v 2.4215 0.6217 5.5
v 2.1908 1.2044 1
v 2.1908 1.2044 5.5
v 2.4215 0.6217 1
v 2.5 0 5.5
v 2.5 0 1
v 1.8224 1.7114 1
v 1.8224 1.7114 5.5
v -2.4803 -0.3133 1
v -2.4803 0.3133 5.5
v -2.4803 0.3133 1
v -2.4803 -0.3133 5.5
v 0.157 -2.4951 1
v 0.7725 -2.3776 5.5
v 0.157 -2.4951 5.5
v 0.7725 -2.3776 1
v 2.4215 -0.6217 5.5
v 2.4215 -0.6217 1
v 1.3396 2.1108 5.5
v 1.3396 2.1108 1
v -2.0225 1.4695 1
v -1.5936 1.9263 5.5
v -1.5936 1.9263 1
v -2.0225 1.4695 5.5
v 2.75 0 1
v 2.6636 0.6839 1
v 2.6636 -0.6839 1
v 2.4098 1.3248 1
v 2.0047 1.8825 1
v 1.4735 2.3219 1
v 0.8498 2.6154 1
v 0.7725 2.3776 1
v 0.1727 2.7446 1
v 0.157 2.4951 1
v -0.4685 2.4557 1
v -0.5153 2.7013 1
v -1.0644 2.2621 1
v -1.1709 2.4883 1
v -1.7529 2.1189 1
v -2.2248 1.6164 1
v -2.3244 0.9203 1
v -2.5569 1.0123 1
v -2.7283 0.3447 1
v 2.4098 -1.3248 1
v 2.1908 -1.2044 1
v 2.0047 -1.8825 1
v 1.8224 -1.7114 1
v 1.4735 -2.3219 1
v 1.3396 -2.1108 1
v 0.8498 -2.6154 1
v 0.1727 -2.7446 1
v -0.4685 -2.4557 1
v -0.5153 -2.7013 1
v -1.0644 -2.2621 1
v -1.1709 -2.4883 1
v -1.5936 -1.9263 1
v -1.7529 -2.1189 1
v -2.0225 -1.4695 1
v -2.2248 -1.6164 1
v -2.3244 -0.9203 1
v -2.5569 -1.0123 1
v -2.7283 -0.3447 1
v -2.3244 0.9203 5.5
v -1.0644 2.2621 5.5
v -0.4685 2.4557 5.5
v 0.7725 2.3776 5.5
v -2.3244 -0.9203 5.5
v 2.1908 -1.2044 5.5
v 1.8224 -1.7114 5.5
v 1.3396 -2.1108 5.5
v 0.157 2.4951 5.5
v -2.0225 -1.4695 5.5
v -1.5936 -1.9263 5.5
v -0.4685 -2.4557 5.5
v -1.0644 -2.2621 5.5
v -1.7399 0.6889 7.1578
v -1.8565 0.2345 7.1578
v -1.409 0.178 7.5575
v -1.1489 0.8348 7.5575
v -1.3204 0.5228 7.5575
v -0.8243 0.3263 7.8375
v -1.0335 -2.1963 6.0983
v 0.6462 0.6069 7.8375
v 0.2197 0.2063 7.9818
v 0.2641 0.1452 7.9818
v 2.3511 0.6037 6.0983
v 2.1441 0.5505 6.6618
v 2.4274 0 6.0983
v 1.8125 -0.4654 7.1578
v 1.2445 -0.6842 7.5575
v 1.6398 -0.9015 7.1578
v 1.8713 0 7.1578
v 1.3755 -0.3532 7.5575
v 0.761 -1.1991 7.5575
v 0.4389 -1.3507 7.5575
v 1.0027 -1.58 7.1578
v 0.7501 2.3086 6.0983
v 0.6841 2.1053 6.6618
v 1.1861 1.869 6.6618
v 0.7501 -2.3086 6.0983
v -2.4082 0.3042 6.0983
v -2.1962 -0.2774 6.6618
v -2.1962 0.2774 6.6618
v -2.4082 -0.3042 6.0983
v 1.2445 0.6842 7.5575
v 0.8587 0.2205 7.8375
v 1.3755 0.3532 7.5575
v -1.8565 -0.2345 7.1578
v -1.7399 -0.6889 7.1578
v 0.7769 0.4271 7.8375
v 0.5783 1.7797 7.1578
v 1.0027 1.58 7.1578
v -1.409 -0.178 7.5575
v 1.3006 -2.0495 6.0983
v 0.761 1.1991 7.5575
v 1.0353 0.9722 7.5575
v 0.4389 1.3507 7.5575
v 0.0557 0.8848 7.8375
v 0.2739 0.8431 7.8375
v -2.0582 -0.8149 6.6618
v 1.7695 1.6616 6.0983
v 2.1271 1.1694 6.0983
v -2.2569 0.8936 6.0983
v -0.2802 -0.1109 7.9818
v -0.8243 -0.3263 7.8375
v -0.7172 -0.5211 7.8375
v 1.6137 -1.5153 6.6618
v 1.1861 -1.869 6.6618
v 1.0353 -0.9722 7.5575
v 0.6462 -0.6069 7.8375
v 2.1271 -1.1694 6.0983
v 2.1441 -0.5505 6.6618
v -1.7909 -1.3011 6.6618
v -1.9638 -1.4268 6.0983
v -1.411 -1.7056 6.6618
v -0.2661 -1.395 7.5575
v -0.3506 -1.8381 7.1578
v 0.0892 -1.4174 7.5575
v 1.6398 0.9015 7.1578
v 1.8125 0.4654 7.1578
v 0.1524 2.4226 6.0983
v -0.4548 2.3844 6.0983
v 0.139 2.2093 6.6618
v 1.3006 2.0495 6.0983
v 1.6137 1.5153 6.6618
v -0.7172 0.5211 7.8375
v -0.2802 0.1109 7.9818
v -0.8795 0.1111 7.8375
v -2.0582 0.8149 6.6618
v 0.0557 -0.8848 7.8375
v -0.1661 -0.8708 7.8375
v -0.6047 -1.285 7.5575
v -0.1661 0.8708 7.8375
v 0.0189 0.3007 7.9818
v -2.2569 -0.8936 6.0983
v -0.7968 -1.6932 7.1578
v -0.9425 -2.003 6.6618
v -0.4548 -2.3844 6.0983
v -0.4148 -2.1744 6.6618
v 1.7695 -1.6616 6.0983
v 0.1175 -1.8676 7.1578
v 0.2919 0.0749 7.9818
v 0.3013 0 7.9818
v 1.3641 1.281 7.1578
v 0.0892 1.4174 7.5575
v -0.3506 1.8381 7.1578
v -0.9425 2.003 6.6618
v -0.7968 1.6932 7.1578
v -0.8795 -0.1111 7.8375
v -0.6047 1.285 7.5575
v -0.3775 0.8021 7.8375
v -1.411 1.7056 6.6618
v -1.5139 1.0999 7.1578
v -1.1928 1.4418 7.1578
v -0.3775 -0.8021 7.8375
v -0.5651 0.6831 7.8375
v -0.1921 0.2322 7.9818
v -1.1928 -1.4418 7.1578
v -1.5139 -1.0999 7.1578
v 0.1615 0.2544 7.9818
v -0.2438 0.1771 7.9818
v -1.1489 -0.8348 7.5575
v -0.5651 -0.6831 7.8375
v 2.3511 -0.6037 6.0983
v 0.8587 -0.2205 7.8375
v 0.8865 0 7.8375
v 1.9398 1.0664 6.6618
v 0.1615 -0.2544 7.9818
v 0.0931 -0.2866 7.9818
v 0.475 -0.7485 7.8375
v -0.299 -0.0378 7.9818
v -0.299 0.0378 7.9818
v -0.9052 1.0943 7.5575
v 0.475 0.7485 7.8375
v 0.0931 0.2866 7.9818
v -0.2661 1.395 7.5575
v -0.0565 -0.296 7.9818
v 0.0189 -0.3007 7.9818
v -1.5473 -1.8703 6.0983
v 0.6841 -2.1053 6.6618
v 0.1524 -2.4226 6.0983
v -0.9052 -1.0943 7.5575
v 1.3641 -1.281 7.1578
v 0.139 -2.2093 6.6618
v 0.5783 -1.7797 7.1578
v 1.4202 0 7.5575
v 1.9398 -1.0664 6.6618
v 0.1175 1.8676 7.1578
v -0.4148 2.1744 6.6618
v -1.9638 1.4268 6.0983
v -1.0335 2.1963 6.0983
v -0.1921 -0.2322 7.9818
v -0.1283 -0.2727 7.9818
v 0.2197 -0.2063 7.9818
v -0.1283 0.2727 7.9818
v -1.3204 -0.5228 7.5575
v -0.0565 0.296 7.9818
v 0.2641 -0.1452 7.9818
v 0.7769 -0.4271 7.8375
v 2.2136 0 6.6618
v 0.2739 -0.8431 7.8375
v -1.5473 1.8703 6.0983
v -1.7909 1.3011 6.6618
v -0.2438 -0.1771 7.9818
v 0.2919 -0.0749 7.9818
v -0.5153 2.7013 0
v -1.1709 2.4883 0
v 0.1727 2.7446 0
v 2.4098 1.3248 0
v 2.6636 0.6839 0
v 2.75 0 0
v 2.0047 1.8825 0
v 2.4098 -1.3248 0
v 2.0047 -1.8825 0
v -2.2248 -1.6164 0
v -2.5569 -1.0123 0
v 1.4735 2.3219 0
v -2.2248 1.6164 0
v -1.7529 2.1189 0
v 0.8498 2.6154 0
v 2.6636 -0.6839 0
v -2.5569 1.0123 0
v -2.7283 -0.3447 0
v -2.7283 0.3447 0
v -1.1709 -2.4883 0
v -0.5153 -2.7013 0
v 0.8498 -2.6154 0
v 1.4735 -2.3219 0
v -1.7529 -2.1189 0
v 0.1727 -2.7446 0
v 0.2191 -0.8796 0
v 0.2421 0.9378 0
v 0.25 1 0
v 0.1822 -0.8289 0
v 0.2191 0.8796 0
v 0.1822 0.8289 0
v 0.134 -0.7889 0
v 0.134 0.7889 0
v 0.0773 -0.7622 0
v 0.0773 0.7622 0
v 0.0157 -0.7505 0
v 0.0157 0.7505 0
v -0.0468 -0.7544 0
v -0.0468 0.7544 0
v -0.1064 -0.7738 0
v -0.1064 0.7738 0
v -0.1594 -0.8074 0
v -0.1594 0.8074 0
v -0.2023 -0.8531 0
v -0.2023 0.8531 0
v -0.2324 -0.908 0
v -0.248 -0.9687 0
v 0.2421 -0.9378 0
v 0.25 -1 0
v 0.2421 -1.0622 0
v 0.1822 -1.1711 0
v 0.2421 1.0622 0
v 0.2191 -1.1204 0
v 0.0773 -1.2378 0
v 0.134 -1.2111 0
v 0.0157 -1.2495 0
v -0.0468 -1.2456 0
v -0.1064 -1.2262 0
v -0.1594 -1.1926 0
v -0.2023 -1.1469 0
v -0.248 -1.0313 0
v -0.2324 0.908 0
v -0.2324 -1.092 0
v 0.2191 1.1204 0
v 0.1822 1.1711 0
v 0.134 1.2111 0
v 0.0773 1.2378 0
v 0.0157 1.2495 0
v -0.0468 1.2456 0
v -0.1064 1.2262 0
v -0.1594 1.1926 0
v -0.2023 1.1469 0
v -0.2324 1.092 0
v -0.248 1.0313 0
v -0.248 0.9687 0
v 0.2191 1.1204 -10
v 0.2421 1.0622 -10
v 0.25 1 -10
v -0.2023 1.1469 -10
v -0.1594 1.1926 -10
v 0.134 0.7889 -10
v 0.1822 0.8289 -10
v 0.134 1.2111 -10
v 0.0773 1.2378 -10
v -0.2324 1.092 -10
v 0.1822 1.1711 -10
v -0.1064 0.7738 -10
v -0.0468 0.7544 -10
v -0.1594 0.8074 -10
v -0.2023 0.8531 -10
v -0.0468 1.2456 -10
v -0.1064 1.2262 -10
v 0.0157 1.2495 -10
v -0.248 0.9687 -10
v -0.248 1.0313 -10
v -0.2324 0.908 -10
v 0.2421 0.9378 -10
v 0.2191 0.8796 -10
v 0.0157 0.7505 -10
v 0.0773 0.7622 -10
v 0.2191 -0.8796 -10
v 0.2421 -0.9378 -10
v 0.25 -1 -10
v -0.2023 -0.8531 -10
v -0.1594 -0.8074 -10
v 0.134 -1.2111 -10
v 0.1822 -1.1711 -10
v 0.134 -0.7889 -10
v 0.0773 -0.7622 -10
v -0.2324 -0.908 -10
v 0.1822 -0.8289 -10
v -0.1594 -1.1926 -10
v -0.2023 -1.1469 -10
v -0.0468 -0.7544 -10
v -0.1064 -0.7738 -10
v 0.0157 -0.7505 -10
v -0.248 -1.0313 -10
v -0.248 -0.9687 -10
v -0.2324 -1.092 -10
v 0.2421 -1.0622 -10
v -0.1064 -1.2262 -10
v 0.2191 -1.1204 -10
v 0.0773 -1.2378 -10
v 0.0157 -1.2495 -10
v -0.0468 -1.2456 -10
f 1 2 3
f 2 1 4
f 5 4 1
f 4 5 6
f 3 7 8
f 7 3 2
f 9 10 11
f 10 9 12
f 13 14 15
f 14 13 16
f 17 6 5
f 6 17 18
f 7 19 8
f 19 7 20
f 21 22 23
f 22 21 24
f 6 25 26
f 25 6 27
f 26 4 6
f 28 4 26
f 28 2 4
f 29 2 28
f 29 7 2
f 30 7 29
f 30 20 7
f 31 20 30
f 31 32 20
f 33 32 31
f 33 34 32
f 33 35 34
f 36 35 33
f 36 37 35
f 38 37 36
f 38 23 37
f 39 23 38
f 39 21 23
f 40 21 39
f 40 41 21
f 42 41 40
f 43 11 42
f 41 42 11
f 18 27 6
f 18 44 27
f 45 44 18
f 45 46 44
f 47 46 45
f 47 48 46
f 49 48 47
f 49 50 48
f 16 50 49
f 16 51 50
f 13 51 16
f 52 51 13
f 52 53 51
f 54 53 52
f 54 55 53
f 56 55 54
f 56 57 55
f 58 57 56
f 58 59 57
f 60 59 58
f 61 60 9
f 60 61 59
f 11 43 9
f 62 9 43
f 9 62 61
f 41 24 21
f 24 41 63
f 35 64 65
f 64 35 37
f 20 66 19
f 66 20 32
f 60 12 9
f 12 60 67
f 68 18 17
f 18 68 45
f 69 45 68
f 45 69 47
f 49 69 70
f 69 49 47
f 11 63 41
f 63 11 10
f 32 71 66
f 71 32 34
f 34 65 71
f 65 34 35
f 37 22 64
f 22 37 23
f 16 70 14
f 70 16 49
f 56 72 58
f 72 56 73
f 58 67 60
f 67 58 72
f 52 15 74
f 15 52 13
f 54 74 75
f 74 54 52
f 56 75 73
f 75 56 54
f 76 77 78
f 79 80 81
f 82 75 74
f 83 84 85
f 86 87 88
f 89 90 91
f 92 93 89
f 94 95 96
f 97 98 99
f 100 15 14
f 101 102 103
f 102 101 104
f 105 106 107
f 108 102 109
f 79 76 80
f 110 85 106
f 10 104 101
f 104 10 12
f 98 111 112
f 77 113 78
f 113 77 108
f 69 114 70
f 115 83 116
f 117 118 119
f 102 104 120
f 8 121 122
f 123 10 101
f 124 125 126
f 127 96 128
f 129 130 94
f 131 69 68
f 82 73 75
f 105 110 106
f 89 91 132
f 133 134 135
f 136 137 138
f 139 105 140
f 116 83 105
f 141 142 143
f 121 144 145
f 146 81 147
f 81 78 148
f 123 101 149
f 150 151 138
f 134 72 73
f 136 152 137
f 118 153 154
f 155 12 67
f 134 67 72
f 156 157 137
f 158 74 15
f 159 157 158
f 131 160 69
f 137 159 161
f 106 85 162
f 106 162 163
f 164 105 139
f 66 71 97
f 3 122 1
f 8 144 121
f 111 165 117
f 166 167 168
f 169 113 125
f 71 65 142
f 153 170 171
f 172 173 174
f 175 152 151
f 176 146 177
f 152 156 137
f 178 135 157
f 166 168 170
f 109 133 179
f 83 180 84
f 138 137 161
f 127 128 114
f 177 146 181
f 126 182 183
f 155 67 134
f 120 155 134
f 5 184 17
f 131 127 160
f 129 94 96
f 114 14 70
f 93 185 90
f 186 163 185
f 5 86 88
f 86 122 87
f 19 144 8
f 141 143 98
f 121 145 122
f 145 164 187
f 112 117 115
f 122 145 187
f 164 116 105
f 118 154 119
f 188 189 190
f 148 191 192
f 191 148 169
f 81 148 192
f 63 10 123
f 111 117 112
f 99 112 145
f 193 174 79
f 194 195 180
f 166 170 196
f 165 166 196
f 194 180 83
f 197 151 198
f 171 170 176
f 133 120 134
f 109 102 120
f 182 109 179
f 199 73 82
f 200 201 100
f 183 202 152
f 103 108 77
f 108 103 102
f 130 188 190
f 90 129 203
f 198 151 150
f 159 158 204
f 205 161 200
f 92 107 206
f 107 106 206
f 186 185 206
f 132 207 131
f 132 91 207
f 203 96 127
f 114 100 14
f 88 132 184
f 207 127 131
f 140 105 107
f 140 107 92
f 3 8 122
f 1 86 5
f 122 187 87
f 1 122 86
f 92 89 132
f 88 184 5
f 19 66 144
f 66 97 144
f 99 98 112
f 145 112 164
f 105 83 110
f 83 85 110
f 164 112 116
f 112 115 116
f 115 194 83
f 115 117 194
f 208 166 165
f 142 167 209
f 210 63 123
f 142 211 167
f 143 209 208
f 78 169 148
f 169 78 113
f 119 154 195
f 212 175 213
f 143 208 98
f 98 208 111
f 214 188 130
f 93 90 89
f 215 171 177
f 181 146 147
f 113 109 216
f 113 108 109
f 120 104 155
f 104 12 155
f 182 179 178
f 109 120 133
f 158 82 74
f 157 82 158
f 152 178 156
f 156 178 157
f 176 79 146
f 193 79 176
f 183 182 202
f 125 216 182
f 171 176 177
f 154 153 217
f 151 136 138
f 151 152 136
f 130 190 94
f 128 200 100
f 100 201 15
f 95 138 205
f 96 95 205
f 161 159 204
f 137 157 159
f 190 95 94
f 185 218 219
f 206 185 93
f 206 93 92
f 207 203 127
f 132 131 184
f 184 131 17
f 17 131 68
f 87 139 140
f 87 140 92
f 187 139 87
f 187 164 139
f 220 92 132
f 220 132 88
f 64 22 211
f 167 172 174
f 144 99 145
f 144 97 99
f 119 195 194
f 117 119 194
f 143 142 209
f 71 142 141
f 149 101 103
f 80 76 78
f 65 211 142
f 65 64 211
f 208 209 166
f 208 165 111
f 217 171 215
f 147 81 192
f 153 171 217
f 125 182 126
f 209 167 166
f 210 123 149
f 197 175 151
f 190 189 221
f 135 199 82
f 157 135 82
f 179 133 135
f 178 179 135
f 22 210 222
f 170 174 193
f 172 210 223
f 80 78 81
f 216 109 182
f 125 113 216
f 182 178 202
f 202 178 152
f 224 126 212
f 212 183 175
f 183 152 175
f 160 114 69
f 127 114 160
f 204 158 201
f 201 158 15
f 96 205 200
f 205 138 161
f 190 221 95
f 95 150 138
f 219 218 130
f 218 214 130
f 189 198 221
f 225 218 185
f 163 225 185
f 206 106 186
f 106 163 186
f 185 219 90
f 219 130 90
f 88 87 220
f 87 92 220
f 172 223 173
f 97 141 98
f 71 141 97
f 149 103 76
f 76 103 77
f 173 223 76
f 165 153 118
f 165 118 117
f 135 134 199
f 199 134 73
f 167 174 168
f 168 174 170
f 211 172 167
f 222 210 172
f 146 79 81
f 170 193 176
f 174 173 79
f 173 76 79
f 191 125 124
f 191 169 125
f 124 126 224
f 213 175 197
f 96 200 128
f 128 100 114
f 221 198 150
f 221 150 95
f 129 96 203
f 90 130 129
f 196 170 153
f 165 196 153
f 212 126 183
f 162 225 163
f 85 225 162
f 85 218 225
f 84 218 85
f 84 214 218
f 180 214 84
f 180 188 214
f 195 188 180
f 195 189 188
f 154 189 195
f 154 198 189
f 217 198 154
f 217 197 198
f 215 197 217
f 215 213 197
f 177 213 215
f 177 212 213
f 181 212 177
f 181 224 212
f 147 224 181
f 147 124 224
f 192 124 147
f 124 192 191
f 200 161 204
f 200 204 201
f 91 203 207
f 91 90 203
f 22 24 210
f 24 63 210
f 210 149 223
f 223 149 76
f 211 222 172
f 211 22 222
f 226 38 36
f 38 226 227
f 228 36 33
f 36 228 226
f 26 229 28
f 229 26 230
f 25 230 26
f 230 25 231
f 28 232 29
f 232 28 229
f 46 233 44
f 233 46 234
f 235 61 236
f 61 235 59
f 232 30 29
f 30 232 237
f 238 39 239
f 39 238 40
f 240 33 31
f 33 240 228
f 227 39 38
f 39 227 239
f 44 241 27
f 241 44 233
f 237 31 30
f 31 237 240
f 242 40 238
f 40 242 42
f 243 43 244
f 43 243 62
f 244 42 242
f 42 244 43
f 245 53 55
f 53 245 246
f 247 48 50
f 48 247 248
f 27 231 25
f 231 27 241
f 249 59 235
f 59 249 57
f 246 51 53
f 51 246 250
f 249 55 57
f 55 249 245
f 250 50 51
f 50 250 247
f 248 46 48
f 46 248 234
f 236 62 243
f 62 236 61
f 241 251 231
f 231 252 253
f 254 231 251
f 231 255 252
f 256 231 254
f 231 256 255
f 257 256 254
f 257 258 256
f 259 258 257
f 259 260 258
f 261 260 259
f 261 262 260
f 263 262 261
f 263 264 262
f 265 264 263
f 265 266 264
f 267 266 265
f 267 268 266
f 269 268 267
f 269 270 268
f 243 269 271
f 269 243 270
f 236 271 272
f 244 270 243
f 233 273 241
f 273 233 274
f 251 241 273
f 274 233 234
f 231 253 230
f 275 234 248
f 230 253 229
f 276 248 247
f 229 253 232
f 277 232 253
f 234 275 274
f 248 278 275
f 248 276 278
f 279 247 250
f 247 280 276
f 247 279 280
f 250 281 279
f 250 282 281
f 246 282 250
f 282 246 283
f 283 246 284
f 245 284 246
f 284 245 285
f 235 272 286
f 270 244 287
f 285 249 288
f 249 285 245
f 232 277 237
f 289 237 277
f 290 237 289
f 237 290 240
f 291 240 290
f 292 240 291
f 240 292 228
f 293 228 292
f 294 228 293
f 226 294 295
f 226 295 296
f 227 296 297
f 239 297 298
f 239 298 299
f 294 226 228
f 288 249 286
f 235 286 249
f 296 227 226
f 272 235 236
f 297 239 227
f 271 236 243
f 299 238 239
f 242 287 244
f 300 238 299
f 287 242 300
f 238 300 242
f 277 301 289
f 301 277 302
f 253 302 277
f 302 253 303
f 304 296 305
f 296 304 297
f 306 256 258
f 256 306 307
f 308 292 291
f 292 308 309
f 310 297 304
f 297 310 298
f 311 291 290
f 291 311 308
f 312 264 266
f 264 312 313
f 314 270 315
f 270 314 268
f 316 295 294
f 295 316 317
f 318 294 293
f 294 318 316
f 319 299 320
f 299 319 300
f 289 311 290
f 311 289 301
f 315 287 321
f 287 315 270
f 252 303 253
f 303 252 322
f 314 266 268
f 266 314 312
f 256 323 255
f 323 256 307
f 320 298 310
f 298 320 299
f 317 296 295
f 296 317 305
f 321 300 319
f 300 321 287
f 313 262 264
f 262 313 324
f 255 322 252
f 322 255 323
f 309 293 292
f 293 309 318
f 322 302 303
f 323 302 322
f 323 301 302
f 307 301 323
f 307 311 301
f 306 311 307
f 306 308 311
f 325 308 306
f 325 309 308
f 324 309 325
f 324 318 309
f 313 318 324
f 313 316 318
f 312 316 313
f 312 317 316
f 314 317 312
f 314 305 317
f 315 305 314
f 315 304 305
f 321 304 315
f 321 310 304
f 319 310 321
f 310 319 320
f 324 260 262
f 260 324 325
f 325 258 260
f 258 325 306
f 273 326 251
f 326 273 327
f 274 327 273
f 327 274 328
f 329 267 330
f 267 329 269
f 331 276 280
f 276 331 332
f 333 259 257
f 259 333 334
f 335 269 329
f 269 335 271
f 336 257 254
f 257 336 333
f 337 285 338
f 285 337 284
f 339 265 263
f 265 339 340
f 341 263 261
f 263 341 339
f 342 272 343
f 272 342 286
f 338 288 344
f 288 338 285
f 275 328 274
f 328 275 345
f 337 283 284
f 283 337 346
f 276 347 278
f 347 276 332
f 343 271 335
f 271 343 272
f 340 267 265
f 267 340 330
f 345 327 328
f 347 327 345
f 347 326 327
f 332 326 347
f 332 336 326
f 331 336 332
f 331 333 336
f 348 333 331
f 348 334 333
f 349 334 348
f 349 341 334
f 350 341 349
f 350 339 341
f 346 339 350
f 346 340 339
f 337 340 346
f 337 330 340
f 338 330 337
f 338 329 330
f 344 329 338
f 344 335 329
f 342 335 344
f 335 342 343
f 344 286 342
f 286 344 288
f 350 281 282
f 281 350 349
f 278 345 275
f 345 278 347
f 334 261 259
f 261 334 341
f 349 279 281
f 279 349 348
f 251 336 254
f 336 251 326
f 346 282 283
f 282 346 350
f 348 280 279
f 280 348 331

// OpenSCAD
//LED Dimensions
led_d=5; //LED Diameter
led_h=8; //LED Height
led_fh=1; //LED FLange Thickness
led_fd=5.5; //LED Flange Diameter
wire_d=.5; //Wire Diameter
wire_h=10; //Wire Height
wire_da=2; // THe distance between the Wires
led();
module led(){
translate([0,0,led_fh])cylinder(led_h-(led_d/2)-led_fh,led_d/2,led_d/2, $fn=25);
translate([0,0,led_h-(led_d/2)])sphere(led_d/2,  $fn=25);
cylinder(led_fh,led_fd/2,led_fd/2, $fn=25);
translate([0,wire_da/2,-wire_h])cylinder(wire_h,wire_d/2,wire_d/2, $fn=25);
translate([0,wire_da/-2,-wire_h])cylinder(wire_h,wire_d/2,wire_d/2, $fn=25);
}
